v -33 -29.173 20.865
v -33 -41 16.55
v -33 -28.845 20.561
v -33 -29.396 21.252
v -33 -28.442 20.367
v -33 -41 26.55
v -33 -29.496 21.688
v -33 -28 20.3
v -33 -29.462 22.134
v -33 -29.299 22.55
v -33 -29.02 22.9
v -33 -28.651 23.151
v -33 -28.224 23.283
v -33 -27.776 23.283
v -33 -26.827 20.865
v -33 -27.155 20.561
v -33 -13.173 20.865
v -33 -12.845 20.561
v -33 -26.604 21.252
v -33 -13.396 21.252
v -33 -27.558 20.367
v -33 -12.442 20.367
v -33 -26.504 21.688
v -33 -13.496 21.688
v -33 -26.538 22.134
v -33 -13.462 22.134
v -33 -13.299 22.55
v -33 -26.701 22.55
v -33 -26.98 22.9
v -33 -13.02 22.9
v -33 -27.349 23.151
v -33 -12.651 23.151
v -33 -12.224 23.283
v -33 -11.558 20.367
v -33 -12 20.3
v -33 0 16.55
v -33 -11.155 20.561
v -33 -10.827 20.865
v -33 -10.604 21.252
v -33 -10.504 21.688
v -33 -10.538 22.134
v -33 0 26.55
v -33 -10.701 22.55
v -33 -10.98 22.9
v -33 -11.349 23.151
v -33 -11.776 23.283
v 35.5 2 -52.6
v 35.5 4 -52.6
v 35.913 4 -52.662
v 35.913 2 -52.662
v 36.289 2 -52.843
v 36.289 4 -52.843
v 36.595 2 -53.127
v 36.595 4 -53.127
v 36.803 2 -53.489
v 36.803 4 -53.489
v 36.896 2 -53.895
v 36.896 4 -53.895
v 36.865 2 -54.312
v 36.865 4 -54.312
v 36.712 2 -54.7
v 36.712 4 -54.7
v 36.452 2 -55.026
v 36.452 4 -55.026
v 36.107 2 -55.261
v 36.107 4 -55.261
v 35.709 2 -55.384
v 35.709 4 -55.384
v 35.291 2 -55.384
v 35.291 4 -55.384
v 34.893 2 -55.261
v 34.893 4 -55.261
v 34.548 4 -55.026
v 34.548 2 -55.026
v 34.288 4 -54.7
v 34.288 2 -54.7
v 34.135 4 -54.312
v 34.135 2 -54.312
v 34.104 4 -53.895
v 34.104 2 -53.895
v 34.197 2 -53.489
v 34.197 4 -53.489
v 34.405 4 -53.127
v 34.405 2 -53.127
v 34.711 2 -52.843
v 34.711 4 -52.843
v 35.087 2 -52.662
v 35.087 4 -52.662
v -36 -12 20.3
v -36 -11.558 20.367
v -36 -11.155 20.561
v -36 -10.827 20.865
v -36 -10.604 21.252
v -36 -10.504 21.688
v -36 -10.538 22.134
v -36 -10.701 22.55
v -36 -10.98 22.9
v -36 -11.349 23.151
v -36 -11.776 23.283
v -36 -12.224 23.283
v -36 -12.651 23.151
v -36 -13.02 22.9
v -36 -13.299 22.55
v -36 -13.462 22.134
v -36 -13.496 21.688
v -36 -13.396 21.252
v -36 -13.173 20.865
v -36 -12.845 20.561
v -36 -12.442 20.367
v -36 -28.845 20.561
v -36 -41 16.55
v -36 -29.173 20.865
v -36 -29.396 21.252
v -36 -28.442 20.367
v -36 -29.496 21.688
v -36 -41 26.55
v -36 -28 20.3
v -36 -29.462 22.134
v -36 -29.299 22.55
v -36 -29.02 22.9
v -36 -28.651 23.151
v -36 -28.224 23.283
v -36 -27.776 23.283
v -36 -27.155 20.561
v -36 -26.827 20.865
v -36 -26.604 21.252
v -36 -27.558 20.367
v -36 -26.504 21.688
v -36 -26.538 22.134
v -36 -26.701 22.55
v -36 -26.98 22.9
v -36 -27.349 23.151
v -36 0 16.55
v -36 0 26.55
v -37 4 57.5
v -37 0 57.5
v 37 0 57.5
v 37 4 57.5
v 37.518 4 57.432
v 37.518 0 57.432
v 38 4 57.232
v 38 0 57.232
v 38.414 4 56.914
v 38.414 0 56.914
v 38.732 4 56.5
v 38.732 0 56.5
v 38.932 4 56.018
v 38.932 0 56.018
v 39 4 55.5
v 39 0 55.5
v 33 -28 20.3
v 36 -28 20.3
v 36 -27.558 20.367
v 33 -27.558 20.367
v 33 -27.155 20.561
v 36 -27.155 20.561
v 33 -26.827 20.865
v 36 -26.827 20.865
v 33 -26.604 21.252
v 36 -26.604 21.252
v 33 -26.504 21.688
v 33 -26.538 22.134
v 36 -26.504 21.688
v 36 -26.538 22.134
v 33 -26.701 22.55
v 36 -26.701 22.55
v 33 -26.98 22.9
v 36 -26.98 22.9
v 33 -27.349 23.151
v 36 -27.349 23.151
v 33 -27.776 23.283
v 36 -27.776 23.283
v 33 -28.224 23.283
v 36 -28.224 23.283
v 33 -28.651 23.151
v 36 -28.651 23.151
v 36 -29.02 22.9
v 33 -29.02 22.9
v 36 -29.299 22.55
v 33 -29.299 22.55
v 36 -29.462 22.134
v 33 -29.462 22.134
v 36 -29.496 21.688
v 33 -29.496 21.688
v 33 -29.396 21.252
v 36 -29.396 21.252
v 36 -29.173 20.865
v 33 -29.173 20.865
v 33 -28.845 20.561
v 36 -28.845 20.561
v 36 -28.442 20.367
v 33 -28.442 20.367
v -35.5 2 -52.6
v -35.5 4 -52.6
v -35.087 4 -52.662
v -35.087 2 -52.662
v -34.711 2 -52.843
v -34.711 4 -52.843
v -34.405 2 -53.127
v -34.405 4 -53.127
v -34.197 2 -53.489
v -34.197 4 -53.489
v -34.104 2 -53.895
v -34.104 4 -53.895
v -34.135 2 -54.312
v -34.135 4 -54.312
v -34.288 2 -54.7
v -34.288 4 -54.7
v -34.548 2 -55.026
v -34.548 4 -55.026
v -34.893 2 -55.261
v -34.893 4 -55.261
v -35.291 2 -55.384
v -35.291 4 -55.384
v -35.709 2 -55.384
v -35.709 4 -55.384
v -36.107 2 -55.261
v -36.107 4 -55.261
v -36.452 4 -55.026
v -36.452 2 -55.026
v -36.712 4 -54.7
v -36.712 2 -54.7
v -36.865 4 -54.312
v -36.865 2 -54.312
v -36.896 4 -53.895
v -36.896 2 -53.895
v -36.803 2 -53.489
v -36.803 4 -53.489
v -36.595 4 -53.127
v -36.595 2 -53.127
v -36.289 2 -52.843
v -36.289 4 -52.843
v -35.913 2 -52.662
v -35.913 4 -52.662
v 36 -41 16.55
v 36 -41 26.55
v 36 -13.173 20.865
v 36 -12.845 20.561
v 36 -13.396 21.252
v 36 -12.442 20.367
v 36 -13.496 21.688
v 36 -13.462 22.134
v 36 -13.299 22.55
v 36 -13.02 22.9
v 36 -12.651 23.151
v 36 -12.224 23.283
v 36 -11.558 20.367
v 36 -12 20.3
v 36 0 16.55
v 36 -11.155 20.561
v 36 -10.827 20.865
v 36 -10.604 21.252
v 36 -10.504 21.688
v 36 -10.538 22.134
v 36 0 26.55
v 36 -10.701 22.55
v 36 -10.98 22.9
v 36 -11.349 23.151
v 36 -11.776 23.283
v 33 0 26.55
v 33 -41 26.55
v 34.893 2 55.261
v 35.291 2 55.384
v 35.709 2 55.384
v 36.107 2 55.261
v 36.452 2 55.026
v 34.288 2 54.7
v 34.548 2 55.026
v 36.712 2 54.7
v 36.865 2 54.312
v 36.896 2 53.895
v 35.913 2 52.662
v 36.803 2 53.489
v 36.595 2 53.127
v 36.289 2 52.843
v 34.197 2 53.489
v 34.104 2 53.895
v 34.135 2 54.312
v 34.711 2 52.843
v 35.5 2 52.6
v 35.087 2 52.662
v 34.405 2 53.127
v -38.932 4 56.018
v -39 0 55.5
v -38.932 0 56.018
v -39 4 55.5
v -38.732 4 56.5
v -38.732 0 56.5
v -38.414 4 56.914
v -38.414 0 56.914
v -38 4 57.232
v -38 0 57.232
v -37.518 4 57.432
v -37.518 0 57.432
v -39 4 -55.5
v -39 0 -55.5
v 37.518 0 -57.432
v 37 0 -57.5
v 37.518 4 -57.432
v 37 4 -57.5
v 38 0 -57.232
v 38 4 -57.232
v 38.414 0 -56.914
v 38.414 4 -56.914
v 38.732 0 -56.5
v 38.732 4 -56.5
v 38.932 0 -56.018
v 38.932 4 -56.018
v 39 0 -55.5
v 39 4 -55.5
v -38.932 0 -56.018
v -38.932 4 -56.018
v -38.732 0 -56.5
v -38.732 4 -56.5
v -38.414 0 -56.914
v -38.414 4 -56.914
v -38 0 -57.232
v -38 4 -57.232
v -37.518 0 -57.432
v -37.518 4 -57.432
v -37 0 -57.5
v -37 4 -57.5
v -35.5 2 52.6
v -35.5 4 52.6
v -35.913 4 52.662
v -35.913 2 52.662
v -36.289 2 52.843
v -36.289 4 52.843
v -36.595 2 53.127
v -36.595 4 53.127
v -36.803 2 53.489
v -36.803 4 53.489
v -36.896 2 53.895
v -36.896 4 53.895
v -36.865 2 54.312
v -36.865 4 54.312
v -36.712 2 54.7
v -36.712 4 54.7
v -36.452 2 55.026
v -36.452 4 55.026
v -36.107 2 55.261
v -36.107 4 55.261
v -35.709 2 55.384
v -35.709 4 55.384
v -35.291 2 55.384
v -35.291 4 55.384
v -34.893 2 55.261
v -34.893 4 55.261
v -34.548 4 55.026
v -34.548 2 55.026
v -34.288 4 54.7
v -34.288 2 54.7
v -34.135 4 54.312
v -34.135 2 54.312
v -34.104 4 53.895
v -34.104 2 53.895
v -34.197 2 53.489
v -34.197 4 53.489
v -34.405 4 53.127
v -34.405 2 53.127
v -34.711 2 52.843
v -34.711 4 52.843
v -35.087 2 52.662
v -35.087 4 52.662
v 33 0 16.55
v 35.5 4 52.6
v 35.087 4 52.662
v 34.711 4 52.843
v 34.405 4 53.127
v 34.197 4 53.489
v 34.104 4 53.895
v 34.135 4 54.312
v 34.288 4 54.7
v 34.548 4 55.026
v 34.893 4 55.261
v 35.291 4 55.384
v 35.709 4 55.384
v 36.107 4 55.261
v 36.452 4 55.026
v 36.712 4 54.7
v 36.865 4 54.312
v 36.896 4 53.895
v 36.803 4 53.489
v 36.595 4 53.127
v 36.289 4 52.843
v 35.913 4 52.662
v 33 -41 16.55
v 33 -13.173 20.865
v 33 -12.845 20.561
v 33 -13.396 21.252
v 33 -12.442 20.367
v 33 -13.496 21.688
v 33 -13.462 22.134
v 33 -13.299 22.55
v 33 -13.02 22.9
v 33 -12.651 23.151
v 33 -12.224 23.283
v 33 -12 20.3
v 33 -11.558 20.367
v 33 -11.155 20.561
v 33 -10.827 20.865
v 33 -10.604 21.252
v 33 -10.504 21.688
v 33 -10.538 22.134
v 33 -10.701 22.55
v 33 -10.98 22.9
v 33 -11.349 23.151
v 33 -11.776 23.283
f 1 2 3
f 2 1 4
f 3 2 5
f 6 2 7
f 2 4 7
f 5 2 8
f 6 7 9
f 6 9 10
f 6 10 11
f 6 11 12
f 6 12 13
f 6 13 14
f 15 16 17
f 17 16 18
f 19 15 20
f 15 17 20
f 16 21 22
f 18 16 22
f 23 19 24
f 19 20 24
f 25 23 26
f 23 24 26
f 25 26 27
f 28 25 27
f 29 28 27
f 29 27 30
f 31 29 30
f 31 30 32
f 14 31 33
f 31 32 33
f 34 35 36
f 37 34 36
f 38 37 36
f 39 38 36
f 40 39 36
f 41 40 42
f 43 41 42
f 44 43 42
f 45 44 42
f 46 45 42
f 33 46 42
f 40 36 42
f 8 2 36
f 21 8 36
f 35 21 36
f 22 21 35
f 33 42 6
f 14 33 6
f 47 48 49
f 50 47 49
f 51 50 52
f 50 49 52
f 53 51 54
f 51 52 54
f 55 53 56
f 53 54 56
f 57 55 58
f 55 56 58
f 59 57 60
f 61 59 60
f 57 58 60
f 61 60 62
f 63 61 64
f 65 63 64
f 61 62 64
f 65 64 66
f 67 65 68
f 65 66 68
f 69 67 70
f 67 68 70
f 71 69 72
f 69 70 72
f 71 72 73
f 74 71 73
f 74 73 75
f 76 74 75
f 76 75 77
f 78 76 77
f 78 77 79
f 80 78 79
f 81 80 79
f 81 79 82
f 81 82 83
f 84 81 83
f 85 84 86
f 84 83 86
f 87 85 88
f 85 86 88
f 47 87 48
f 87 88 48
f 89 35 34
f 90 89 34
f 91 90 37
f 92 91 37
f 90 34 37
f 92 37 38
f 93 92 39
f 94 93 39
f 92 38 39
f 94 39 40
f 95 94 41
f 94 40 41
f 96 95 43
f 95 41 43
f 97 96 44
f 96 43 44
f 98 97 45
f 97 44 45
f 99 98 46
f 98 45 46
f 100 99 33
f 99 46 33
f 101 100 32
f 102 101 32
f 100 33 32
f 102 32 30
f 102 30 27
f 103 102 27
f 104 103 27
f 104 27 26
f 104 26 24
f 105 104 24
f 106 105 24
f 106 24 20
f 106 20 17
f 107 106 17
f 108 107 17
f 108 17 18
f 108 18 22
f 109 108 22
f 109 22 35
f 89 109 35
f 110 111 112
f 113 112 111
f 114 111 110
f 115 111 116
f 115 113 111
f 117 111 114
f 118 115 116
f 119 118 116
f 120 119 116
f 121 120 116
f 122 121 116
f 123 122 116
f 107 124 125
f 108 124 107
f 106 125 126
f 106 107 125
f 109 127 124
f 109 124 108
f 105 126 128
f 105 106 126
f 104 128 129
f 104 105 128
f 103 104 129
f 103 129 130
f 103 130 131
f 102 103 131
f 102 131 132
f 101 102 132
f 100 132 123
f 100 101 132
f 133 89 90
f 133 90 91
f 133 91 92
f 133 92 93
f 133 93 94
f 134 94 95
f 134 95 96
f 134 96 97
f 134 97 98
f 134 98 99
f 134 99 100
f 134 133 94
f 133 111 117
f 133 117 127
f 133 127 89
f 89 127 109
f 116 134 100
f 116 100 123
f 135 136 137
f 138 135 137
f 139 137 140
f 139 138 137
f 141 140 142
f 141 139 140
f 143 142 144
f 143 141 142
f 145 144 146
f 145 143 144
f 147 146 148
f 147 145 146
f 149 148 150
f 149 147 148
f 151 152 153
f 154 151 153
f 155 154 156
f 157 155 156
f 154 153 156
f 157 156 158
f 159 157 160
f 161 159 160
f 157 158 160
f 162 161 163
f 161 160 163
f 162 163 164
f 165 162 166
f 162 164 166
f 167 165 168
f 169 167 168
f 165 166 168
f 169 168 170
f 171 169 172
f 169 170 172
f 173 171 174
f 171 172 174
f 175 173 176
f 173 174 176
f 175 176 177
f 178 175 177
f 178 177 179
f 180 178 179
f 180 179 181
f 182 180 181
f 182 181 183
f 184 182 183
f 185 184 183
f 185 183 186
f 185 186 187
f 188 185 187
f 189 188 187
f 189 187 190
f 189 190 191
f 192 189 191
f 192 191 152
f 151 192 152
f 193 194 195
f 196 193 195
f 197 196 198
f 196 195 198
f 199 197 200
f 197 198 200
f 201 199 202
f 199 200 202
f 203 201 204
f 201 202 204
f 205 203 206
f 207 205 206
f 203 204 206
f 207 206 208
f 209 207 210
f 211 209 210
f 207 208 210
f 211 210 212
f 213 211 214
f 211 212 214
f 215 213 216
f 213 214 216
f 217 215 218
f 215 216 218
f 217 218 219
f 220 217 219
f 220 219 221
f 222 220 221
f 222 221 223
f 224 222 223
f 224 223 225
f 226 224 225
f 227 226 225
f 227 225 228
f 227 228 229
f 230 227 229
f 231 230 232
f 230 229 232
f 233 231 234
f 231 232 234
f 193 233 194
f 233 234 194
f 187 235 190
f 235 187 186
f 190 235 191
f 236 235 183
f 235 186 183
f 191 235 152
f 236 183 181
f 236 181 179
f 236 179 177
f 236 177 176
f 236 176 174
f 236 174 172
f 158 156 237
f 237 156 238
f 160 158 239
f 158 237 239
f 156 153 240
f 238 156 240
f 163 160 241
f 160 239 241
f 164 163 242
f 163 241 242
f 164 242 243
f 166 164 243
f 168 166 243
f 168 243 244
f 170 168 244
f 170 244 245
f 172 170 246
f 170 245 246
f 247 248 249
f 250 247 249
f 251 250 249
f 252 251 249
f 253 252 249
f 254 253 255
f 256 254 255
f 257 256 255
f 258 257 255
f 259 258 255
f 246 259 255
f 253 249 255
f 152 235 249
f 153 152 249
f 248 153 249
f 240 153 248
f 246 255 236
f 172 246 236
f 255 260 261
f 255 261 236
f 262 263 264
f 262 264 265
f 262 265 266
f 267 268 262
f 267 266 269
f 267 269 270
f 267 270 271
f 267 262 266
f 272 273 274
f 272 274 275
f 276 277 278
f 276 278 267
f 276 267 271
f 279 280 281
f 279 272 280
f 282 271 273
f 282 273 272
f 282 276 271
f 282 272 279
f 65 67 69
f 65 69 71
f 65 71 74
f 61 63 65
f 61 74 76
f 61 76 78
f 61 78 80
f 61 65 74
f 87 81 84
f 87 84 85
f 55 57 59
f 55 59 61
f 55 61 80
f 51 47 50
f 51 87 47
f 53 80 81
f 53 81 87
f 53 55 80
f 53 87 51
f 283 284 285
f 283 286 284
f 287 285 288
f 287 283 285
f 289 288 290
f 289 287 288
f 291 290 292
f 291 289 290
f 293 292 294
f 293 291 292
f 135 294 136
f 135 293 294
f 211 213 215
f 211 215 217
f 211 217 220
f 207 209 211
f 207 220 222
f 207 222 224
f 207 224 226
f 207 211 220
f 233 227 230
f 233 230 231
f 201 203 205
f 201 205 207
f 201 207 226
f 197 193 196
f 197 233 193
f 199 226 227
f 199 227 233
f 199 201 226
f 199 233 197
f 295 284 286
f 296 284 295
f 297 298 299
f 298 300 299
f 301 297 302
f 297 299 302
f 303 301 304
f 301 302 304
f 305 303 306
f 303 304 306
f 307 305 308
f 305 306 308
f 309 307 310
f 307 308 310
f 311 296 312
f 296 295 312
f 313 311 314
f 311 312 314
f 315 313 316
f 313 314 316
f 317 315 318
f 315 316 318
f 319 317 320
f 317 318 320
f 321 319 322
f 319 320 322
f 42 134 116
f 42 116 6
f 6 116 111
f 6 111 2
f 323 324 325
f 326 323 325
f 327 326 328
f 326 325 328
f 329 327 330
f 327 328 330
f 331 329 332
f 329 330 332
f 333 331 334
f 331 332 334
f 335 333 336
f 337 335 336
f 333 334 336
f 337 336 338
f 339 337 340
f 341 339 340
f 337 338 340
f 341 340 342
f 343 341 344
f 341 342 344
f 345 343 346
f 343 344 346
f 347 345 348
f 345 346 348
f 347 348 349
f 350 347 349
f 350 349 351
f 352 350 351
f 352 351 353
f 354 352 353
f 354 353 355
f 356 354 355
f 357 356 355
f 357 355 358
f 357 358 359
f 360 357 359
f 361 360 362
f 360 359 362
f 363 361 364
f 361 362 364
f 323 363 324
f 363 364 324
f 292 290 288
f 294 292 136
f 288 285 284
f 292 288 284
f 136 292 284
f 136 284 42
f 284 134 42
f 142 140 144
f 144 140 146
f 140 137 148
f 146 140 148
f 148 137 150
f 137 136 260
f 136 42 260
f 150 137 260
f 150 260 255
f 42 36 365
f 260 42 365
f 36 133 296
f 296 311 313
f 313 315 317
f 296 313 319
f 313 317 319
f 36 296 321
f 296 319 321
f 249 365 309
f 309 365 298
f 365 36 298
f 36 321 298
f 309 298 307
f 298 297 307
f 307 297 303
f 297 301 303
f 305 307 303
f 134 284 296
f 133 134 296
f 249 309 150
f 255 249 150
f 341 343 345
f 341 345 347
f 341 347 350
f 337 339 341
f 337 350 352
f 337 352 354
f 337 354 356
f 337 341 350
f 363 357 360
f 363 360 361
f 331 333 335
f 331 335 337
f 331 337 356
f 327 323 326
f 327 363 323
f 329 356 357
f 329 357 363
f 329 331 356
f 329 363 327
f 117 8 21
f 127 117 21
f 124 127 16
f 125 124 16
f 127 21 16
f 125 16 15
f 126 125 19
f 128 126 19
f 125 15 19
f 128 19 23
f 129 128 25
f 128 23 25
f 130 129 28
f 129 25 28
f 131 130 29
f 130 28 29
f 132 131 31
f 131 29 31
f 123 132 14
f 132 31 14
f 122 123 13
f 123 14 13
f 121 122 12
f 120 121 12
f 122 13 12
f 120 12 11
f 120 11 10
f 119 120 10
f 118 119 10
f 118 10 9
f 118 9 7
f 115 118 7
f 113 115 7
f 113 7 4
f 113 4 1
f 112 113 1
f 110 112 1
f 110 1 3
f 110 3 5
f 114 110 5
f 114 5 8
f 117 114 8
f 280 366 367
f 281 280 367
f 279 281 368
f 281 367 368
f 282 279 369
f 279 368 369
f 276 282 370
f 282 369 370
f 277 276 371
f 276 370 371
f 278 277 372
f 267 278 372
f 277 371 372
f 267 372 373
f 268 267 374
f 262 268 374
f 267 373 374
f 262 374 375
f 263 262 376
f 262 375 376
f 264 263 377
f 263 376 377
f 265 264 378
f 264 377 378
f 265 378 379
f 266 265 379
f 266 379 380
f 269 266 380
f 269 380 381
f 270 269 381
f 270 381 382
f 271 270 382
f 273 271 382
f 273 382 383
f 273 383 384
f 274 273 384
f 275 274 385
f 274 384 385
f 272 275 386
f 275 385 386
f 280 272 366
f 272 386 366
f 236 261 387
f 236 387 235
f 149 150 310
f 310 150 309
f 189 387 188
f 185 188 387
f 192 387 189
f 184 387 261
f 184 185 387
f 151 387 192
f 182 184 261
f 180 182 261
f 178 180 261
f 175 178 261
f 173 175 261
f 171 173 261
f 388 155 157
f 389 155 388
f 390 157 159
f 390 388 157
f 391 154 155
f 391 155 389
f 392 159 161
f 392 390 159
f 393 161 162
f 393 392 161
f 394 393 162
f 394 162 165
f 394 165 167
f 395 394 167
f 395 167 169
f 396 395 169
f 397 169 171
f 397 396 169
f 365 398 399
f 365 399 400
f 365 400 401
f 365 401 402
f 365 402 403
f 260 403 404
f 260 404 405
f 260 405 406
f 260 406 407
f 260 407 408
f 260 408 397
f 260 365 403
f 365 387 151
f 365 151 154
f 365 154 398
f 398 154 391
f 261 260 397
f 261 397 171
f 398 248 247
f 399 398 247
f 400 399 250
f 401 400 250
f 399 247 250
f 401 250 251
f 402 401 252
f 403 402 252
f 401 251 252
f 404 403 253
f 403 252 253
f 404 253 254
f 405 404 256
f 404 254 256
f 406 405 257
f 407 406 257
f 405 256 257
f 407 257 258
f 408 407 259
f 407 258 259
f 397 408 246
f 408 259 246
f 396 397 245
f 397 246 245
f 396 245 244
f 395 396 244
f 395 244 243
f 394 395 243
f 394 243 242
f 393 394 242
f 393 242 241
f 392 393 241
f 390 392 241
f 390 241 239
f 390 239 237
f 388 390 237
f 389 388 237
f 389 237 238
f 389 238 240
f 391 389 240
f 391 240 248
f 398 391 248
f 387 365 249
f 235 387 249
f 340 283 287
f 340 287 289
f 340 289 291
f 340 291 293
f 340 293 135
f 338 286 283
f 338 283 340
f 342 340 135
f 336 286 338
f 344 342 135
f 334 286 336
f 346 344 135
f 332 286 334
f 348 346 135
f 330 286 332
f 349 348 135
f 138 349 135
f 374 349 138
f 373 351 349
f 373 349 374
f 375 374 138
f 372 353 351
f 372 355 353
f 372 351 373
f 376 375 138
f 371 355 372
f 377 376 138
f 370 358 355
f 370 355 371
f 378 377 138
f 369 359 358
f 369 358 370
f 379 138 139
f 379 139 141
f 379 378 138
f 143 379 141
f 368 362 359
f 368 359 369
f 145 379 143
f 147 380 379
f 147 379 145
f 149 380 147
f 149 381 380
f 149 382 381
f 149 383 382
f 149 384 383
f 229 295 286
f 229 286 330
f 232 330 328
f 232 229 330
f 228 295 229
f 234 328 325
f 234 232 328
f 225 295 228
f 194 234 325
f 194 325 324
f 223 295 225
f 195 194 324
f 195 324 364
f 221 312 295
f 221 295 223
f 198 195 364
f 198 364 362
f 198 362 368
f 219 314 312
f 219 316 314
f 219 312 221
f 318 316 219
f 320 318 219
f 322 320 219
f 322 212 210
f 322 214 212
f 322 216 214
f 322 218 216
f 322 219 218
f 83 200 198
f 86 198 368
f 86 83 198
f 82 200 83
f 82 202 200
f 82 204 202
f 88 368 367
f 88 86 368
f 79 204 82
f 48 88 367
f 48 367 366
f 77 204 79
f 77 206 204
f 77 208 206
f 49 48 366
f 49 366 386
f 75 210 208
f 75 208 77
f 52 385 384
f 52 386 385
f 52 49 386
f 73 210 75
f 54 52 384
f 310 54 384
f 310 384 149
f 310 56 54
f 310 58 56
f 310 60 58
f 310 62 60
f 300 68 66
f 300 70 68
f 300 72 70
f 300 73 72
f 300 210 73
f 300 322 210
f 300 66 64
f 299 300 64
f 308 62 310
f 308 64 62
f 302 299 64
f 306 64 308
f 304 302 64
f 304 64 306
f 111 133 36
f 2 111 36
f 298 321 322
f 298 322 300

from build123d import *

# Parameters (mm, degrees)
SKETCH1_W           = 78
SKETCH1_H           = 115
BOSS_EXTRUDE1_DEPTH = 4
SKETCH5_R           = 1.4
CUT_EXTRUDE3_DEPTH  = 2
SKETCH6_W           = 3
SKETCH6_H           = 10
BOSS_EXTRUDE3_DEPTH = 41
SKETCH7_R           = 1.5
CUT_EXTRUDE4_DEPTH  = 104.015775491
FILLET1_R           = 2


with BuildPart() as part:
    # Sketch1 → Boss-Extrude1 (new body)
    with BuildSketch(Plane(origin=(0, 0, 0), x_dir=(1, 0, 0), z_dir=(0, 1, 0))):
        Rectangle(SKETCH1_W, SKETCH1_H)
    extrude(amount=BOSS_EXTRUDE1_DEPTH)

    # Sketch5 → Cut-Extrude3 (cut)
    with BuildSketch(Plane(origin=(0, 4, 0), x_dir=(1, 0, 0), z_dir=(0, 1, 0))):
        with Locations(Location((-35.5, 54, 0), (0, 0, 270))):
            Circle(SKETCH5_R)
        with Locations(Location((35.5, 54, 0), (0, 0, 270))):
            Circle(SKETCH5_R)
        with Locations(Location((35.5, -54, 0), (0, 0, 90))):
            Circle(SKETCH5_R)
        with Locations(Location((-35.5, -54, 0), (0, 0, 90))):
            Circle(SKETCH5_R)
    extrude(amount=-CUT_EXTRUDE3_DEPTH, mode=Mode.SUBTRACT)

    # Sketch6 → Boss-Extrude3 (add)
    with BuildSketch(Plane.XZ):
        with Locations((-34.5, 21.55)):
            Rectangle(SKETCH6_W, SKETCH6_H)
        with Locations((34.5, 21.55)):
            Rectangle(SKETCH6_W, SKETCH6_H)
    extrude(amount=BOSS_EXTRUDE3_DEPTH)

    # Sketch7 → Cut-Extrude4 (cut, through all)
    with BuildSketch(Plane(origin=(36, 0, 0), x_dir=(0, 0, -1), z_dir=(1, 0, 0))):
        with Locations((-21.8, -12)):
            Circle(SKETCH7_R)
        with Locations((-21.8, -28)):
            Circle(SKETCH7_R)
    extrude(amount=-CUT_EXTRUDE4_DEPTH, mode=Mode.SUBTRACT)

    # Fillet1
    fillet1_edges = [part.edges().sort_by_distance(p)[0] for p in [
        (-39, 2, -57.5),
        (39, 2, -57.5),
        (39, 2, 57.5),
        (-39, 2, 57.5),
    ]]
    fillet(fillet1_edges, radius=FILLET1_R)


solid = part.part
